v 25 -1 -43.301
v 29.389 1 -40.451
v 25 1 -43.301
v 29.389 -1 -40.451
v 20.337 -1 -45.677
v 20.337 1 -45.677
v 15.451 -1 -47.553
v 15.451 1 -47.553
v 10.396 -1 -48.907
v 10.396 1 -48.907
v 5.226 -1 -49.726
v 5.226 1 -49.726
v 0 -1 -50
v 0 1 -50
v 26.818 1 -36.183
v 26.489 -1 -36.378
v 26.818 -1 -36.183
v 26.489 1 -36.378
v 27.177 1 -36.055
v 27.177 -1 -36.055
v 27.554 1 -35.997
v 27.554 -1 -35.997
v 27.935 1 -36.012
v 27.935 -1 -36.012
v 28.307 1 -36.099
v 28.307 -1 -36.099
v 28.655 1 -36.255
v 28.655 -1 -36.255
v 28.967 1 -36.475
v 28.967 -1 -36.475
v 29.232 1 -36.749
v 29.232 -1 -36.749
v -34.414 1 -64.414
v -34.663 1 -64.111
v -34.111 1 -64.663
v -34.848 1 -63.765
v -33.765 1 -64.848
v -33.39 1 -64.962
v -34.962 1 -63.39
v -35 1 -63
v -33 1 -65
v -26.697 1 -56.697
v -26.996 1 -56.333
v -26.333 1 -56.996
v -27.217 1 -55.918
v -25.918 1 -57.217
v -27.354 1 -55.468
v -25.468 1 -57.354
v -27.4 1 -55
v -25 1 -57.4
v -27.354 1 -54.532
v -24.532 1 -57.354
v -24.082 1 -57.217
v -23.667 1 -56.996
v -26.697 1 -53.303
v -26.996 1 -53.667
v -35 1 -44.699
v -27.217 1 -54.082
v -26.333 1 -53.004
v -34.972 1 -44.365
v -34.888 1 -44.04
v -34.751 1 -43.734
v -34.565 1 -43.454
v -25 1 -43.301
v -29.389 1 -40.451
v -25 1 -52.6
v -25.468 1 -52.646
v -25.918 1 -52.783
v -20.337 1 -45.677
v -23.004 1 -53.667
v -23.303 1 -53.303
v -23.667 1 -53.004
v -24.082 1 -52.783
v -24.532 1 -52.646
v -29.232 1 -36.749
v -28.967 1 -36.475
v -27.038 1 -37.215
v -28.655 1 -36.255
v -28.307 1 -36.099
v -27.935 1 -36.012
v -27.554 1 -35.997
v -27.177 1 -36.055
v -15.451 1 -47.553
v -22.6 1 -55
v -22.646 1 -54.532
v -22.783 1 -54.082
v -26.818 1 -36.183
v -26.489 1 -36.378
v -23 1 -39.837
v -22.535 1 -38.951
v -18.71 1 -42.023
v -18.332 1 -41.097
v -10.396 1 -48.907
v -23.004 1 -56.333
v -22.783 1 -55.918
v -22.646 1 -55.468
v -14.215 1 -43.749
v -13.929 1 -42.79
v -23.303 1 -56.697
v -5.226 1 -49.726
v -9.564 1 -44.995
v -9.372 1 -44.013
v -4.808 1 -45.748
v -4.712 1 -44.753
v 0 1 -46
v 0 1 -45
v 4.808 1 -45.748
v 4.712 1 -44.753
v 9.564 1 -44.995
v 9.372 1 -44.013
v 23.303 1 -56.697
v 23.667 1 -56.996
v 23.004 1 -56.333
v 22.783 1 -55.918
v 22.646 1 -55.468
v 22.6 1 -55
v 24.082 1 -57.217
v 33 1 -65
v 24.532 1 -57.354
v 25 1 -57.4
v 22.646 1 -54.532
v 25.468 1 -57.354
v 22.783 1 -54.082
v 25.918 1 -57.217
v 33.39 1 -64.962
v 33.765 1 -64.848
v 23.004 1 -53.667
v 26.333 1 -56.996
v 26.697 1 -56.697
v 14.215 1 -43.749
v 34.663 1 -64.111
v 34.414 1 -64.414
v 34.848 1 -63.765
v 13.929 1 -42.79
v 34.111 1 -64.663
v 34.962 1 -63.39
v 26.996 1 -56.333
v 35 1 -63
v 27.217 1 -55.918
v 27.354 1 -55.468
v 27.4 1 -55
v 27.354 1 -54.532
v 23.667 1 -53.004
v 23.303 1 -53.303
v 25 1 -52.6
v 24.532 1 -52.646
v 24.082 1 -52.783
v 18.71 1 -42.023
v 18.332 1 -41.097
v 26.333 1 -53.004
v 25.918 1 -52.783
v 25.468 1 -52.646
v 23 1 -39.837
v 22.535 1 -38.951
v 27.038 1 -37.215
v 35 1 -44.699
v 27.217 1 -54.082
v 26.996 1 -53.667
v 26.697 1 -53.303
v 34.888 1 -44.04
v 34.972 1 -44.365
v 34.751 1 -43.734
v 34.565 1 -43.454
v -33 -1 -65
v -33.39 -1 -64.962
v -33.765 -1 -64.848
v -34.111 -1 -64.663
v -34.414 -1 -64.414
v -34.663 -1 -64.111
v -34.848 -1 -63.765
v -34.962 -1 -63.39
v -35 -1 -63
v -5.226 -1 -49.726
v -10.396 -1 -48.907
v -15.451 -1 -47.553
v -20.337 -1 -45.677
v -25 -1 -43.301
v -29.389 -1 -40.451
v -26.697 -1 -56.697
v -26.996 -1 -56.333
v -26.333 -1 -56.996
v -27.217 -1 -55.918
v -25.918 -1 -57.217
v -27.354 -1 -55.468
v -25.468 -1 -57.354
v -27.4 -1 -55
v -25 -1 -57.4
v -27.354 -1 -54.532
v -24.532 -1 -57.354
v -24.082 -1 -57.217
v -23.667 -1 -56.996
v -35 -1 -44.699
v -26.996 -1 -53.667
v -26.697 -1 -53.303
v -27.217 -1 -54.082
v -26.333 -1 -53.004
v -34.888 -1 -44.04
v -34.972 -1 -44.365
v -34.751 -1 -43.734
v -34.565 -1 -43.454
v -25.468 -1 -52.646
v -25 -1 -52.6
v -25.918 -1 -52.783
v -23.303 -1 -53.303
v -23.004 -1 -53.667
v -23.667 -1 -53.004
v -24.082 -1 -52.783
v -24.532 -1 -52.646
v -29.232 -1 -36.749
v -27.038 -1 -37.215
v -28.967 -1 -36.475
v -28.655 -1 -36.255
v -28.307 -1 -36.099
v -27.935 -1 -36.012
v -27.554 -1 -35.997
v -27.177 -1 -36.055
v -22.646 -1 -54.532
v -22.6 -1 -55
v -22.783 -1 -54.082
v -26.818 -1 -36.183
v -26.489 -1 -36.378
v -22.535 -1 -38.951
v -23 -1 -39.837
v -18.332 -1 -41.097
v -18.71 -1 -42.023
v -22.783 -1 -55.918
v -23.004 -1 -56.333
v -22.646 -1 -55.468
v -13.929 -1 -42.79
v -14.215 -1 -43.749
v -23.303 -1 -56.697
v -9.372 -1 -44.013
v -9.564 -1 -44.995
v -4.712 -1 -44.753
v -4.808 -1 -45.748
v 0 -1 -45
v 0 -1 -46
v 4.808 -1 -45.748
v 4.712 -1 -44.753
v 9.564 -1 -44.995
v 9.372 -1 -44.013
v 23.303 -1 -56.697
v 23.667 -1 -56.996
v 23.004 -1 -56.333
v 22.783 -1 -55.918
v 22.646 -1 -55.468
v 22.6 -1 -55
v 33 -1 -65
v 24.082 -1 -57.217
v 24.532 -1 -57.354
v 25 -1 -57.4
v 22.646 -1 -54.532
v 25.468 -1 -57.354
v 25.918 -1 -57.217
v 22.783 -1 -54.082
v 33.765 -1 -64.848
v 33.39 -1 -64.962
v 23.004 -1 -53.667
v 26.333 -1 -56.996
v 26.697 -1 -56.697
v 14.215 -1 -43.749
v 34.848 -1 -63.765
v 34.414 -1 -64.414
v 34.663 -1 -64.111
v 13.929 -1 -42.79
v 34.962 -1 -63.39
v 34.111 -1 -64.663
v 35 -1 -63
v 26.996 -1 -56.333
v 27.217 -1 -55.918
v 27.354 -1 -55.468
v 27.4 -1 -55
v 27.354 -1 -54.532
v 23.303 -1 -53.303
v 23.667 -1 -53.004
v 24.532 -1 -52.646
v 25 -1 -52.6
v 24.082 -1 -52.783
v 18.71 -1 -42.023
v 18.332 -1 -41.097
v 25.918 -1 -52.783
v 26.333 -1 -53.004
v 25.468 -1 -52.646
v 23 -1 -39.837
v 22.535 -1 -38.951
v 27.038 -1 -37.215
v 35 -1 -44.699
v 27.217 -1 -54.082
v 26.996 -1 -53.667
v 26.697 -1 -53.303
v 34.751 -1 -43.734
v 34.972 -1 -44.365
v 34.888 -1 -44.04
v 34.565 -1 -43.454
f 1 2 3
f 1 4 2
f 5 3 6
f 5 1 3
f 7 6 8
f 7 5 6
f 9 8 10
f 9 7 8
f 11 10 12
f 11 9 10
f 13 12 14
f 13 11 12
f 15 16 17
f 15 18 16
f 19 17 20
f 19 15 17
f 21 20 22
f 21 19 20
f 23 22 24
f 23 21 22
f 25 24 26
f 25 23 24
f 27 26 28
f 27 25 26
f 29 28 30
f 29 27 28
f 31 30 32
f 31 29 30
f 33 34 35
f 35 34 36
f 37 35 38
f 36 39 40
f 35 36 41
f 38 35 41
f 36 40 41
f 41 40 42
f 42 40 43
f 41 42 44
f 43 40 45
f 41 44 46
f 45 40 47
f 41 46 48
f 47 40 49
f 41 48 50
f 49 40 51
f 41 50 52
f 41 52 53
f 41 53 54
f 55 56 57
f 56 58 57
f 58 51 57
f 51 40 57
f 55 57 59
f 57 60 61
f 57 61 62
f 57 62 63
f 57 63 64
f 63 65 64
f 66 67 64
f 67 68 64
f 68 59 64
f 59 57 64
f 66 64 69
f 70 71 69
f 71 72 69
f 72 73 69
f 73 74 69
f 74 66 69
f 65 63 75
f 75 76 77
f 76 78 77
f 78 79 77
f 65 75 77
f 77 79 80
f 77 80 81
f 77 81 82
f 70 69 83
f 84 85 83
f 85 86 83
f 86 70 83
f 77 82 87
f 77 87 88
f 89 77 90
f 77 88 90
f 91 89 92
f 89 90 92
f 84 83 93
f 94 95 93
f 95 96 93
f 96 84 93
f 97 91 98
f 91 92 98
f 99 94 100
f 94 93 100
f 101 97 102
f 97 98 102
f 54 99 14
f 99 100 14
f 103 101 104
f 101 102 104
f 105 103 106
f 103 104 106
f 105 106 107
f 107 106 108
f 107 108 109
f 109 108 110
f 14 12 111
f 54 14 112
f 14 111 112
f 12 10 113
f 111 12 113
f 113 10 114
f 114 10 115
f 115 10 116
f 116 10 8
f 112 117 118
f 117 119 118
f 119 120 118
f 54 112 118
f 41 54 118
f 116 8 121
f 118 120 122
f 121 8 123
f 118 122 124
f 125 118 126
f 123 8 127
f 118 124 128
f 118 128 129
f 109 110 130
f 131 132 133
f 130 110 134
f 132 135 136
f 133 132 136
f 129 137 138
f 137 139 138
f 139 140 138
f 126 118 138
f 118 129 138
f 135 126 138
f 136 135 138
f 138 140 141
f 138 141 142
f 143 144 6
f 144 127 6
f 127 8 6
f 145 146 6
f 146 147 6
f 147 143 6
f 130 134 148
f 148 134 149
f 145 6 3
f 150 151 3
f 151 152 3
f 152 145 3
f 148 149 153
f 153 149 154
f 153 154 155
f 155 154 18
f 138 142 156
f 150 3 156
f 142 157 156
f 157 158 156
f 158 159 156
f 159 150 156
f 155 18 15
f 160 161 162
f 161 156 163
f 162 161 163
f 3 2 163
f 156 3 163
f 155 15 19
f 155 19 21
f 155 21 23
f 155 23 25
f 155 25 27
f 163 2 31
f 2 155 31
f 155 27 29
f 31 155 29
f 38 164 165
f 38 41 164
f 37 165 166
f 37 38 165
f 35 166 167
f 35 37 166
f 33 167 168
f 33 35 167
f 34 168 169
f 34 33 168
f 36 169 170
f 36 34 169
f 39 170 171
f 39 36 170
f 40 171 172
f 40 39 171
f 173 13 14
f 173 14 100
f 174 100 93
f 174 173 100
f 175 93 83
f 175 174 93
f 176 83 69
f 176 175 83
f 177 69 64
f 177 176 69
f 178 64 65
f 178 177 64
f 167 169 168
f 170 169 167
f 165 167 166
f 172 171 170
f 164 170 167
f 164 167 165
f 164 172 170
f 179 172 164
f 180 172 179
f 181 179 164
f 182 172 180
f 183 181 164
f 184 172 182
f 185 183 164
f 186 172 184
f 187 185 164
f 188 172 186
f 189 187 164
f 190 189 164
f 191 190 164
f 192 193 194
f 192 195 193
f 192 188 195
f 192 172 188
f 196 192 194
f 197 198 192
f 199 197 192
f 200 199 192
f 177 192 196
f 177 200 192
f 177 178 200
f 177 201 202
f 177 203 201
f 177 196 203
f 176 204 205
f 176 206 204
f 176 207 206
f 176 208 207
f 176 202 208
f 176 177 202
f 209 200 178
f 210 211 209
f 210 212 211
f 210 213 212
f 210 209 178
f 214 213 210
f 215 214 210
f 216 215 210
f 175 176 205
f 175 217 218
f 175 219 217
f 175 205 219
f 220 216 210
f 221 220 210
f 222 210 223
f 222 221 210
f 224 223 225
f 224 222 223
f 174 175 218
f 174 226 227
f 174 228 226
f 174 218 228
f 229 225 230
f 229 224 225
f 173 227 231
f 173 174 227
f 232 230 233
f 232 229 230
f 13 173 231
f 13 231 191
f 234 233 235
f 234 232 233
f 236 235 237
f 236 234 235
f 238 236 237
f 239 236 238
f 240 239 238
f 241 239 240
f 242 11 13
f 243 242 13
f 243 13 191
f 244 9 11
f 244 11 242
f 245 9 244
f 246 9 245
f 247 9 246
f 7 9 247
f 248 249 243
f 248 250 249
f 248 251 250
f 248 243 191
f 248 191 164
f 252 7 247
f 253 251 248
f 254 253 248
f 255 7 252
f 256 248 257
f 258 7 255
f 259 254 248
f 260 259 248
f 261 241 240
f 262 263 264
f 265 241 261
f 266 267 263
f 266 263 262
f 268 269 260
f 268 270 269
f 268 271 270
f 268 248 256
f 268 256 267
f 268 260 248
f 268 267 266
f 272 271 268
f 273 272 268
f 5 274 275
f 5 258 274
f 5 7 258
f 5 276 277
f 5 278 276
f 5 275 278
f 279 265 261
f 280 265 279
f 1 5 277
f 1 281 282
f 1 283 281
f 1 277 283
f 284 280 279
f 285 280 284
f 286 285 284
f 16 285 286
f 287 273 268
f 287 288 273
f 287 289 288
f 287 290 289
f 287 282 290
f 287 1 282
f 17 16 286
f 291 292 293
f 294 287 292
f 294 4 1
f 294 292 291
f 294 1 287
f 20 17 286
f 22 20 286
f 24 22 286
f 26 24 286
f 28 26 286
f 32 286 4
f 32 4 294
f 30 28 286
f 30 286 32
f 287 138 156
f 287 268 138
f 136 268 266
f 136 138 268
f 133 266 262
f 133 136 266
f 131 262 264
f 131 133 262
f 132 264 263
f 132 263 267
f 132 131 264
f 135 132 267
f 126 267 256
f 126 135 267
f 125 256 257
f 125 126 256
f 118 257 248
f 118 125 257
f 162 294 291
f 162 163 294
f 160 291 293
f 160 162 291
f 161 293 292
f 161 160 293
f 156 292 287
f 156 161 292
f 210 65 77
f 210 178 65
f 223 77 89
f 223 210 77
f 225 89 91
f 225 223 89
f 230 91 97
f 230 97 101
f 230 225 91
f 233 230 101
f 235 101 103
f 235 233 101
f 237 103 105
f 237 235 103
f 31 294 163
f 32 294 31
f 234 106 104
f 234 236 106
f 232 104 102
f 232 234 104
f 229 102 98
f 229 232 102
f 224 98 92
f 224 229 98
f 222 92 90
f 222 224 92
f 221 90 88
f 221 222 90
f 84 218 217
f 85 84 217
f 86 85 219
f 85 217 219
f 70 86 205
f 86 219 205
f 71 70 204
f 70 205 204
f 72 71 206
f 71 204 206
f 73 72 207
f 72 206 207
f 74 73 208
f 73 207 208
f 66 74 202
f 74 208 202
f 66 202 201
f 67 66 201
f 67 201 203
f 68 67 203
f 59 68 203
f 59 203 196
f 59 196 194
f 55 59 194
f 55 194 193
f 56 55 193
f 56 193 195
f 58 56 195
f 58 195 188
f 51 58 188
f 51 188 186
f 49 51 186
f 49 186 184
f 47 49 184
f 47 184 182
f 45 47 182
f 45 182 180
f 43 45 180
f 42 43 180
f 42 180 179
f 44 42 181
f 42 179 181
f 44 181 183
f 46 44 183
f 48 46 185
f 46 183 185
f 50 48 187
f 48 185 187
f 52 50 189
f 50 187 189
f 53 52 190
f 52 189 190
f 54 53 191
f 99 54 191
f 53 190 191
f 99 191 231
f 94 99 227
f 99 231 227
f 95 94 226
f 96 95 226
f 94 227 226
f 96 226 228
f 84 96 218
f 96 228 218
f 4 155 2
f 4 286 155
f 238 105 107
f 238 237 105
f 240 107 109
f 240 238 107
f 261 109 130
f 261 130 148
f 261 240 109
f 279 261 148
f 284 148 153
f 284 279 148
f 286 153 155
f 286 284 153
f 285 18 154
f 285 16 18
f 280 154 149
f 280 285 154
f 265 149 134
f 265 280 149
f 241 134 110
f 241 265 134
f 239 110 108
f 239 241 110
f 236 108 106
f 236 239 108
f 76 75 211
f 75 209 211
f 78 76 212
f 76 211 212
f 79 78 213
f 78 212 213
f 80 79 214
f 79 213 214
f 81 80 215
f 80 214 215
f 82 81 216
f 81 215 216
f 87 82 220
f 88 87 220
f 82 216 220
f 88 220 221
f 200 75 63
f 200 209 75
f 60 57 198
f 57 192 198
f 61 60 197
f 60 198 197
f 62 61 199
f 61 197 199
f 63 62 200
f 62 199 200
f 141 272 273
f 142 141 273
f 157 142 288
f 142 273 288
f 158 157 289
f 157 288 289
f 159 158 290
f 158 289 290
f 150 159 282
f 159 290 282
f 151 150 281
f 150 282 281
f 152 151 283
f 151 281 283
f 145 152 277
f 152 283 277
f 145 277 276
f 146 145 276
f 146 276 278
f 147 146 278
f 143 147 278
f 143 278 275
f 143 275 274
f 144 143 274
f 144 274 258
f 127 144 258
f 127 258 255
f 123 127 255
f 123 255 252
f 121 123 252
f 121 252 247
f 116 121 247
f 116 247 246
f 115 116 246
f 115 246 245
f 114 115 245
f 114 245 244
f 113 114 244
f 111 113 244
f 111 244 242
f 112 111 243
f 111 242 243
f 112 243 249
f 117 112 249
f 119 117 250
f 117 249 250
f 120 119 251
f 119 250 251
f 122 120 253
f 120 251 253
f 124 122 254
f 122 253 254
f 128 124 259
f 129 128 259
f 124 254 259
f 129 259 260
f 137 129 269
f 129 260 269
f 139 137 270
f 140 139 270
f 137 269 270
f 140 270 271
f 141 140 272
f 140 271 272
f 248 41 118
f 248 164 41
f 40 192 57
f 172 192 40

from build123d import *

# Parameters (mm, degrees)
F1_DEPTH = 1
F2_R     = 2
F3_R     = 2.4
F4_DEPTH = 25
F5_R     = 2


with BuildPart() as f1:
    # F0 (on Front) → F1 (new body, symmetric)
    with BuildSketch(Plane.XZ):
        with BuildLine():
            ThreePointArc((28.013159, -35.217367), (14.836079, -42.484006), (0, -45))
            ThreePointArc((0, -45), (-14.836079, -42.484006), (-28.013159, -35.217367))
            Line((-28.013159, -35.217367), (-35, -44.00103))
            Line((-35, -44.00103), (-35, -65))
            Line((-35, -65), (35, -65))
            Line((35, -65), (35, -44.00103))
            Line((35, -44.00103), (28.013159, -35.217367))
        make_face()
        with BuildLine():
            ThreePointArc((0, -50), (-15.45085, -47.552826), (-29.389263, -40.45085))
            Line((-29.389263, -40.45085), (-27.038122, -37.214782))
            ThreePointArc((-27.038122, -37.214782), (-14.214782, -43.7486), (0, -46))
            ThreePointArc((0, -46), (14.214782, -43.7486), (27.038122, -37.214782))
            Line((27.038122, -37.214782), (29.389263, -40.45085))
            ThreePointArc((29.389263, -40.45085), (15.45085, -47.552826), (0, -50))
        make_face(mode=Mode.SUBTRACT)
    extrude(amount=F1_DEPTH, both=True)

    # F2
    f2_edges = [f1.edges().sort_by_distance(p)[0] for p in [
        (28.013159, 0, -35.217367),
        (35, 0, -44.00103),
        (-28.013159, 0, -35.217367),
        (-35, 0, -44.00103),
    ]]
    fillet(f2_edges, radius=F2_R)

    # F3 (on face) → F4 (cut)
    with BuildSketch(Plane.XZ.offset(1)):
        with Locations((-25, -55)):
            Circle(F3_R)
        with Locations((25, -55)):
            Circle(F3_R)
    extrude(amount=-F4_DEPTH, mode=Mode.SUBTRACT)

    # F5
    f5_edges = [f1.edges().sort_by_distance(p)[0] for p in [
        (35, 0, -65),
        (-35, 0, -65),
    ]]
    fillet(f5_edges, radius=F5_R)


solid = f1.part
